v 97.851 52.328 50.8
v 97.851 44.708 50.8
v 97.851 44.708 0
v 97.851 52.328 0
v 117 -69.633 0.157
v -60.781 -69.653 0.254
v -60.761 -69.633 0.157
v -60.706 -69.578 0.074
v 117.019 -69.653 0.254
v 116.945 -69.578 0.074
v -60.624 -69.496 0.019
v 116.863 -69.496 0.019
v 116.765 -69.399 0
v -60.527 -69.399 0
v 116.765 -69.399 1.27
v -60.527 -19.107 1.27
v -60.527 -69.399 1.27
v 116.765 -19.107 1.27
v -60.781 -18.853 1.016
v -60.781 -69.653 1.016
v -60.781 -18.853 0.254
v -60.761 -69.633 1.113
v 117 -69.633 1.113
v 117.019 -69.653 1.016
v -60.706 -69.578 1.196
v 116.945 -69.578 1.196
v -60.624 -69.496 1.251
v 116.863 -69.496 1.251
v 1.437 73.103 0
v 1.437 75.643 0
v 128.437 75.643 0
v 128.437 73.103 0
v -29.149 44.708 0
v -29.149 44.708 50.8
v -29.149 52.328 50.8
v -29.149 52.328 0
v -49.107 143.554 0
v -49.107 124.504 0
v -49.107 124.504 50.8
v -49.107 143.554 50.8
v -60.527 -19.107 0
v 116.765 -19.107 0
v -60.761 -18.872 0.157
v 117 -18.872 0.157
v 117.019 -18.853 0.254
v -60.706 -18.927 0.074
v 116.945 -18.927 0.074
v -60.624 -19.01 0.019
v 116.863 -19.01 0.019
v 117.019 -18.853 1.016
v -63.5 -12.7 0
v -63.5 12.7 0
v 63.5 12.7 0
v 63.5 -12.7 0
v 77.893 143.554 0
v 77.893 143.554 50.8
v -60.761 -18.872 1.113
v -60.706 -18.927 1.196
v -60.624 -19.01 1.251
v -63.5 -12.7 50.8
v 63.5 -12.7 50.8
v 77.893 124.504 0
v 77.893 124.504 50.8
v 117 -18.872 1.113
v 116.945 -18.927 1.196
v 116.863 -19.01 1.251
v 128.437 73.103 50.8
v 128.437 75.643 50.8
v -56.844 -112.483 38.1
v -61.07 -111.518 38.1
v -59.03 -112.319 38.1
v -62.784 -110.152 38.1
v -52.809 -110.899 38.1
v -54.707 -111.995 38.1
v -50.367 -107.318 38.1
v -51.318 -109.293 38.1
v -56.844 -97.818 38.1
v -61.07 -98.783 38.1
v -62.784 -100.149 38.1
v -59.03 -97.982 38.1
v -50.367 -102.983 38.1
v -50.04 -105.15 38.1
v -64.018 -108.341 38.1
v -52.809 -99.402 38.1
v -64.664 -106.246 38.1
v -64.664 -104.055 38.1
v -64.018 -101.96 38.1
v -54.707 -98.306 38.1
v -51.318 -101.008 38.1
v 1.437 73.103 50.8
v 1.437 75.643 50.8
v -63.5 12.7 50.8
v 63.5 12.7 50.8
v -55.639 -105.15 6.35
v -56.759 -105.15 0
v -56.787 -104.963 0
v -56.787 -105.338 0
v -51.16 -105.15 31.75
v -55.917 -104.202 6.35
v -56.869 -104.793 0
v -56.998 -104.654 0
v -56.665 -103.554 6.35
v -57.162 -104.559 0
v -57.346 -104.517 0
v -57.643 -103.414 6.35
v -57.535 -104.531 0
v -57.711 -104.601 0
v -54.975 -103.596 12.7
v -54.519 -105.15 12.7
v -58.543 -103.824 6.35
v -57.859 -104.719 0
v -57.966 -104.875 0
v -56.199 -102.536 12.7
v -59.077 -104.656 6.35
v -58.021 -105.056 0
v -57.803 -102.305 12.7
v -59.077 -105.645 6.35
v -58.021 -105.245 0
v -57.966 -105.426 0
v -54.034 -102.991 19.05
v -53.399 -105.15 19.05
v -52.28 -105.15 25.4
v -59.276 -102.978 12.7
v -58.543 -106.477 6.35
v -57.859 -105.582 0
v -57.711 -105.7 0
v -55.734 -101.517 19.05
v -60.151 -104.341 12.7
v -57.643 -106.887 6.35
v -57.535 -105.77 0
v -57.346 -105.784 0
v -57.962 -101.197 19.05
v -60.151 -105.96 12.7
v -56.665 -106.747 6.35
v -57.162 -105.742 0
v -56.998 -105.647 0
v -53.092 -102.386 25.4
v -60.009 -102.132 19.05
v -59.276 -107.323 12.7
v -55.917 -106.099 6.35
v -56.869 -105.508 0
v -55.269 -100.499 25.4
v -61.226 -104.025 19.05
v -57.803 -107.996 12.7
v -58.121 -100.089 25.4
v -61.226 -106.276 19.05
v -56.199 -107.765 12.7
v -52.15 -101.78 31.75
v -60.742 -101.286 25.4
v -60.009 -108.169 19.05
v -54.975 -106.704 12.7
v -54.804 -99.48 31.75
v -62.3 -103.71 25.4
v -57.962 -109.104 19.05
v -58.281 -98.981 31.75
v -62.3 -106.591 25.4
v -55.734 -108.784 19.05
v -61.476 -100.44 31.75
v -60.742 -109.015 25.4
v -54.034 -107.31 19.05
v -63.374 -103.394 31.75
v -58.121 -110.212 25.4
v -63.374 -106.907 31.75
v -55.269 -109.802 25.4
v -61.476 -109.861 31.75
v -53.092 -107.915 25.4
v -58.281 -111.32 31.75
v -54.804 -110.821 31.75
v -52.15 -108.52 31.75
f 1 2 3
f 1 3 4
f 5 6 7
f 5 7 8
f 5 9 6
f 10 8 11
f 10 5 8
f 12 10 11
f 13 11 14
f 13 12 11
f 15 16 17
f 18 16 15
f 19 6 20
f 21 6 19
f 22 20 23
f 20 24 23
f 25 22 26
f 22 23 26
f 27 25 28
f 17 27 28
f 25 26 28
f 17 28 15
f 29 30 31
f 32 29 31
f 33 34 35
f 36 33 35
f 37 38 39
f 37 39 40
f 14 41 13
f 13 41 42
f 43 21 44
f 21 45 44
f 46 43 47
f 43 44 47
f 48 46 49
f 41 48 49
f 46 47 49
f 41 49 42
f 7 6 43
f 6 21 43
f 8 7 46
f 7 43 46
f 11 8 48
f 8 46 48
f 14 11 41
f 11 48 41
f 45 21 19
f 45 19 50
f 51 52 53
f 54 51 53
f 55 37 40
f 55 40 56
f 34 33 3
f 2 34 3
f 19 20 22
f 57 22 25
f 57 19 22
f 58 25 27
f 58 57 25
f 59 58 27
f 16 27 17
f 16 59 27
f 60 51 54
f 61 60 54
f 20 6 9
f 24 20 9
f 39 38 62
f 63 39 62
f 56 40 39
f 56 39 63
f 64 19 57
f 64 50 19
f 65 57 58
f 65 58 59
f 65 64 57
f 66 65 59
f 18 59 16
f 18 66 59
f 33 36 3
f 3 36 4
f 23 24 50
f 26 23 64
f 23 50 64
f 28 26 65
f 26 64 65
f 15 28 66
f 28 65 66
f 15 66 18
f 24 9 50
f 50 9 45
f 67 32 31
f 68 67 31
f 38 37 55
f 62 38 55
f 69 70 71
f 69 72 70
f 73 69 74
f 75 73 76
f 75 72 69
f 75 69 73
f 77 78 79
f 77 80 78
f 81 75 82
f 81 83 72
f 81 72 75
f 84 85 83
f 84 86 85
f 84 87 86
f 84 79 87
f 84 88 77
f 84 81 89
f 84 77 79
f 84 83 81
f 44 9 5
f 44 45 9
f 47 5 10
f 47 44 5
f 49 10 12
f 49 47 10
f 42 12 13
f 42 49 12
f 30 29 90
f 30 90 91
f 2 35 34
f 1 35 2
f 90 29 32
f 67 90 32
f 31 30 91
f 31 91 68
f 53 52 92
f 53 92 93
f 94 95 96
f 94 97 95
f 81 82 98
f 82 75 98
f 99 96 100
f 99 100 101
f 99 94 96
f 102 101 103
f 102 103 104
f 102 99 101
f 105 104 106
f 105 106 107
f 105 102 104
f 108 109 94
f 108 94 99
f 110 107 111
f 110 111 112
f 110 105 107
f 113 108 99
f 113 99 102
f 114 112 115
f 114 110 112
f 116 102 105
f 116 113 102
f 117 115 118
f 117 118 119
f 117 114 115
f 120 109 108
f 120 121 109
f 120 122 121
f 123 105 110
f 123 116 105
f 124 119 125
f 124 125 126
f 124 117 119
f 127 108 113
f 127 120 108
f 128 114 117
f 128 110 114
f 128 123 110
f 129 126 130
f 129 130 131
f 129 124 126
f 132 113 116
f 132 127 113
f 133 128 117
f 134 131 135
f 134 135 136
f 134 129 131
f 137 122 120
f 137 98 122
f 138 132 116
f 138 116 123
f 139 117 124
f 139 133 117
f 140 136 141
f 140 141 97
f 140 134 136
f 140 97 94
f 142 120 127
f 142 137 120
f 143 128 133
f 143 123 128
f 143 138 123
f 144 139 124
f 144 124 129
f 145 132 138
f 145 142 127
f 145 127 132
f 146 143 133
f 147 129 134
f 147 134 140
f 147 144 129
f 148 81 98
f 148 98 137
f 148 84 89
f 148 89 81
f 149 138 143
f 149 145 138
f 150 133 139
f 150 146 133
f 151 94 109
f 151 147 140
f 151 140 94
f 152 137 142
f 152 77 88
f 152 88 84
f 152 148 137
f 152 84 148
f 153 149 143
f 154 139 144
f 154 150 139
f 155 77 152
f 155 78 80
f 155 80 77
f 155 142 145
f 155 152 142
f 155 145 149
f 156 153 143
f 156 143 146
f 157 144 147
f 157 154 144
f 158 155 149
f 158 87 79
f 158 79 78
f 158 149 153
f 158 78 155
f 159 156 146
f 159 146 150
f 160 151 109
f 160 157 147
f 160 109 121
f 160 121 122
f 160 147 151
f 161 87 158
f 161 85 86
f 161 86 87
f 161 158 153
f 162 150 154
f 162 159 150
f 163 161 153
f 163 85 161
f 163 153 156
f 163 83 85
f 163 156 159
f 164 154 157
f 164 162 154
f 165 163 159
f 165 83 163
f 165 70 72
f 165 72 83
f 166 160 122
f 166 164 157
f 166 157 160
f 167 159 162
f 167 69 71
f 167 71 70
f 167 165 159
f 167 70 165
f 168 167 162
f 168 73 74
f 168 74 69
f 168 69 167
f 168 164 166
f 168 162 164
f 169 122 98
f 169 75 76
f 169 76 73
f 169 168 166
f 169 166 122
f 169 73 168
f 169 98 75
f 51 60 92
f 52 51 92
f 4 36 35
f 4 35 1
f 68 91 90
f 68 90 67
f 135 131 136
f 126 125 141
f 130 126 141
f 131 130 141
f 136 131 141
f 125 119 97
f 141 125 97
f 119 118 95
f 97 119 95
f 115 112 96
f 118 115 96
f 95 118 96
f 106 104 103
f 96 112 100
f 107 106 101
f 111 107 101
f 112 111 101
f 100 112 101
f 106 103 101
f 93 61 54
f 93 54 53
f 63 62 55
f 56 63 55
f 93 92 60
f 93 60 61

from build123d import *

# Parameters (mm, degrees)
F0_W      = 127
F0_H      = 25.4
F1_DEPTH  = 50.8
F2_W      = 127
F2_H      = 7.62
F3_DEPTH  = 50.8
F4_W      = 127
F4_H      = 2.54
F5_DEPTH  = 50.8
F6_W      = 127
F6_H      = 19.05
F7_DEPTH  = 50.8
F8_W      = 177.8
F8_H      = 50.8
F9_DEPTH  = 1.27
F10_R     = 0.254
F11_R     = 0.635
F12_DEPTH = 38.1
F12_TAPER = -10


with BuildPart() as f1:
    # F0 (on Top) → F1 (new body)
    with BuildSketch(Plane.XY):
        Rectangle(F0_W, F0_H)
    extrude(amount=F1_DEPTH)


with BuildPart() as f3:
    # F2 (on Top) → F3 (new body)
    with BuildSketch(Plane.XY):
        with Locations((34.3506590051, 48.5184900463)):
            Rectangle(F2_W, F2_H)
    extrude(amount=F3_DEPTH)


with BuildPart() as f5:
    # F4 (on Top) → F5 (new body)
    with BuildSketch(Plane.XY):
        with Locations((64.9371149779, 74.3728727102)):
            Rectangle(F4_W, F4_H)
    extrude(amount=F5_DEPTH)


with BuildPart() as f7:
    # F6 (on Top) → F7 (new body)
    with BuildSketch(Plane.XY):
        with Locations((14.3926842676, 134.0286082506)):
            Rectangle(F6_W, F6_H)
    extrude(amount=F7_DEPTH)


with BuildPart() as f9:
    # F8 (on Top) → F9 (new body)
    with BuildSketch(Plane.XY):
        with Locations((28.1193399813, -44.2528277636)):
            Rectangle(F8_W, F8_H)
    extrude(amount=F9_DEPTH)

    # F10
    f10_edges = [f9.edges().sort_by_distance(p)[0] for p in [
        (28.11934, -18.852828, 1.27),
        (28.11934, -18.852828, 0),
        (-60.78066, -44.252828, 0),
        (-60.78066, -44.252828, 1.27),
        (28.11934, -69.652828, 1.27),
        (28.11934, -69.652828, 0),
        (117.01934, -44.252828, 0),
        (117.01934, -44.252828, 1.27),
    ]]
    fillet(f10_edges, radius=F10_R)


with BuildPart() as f12:
    # F11 (on Top) → F12 (new body)
    with BuildSketch(Plane.XY):
        with Locations((-57.3935061693, -105.1504760981)):
            Circle(F11_R)
    extrude(amount=F12_DEPTH, taper=F12_TAPER)


solid = Compound([f1.part, f3.part, f5.part, f7.part, f9.part, f12.part])
